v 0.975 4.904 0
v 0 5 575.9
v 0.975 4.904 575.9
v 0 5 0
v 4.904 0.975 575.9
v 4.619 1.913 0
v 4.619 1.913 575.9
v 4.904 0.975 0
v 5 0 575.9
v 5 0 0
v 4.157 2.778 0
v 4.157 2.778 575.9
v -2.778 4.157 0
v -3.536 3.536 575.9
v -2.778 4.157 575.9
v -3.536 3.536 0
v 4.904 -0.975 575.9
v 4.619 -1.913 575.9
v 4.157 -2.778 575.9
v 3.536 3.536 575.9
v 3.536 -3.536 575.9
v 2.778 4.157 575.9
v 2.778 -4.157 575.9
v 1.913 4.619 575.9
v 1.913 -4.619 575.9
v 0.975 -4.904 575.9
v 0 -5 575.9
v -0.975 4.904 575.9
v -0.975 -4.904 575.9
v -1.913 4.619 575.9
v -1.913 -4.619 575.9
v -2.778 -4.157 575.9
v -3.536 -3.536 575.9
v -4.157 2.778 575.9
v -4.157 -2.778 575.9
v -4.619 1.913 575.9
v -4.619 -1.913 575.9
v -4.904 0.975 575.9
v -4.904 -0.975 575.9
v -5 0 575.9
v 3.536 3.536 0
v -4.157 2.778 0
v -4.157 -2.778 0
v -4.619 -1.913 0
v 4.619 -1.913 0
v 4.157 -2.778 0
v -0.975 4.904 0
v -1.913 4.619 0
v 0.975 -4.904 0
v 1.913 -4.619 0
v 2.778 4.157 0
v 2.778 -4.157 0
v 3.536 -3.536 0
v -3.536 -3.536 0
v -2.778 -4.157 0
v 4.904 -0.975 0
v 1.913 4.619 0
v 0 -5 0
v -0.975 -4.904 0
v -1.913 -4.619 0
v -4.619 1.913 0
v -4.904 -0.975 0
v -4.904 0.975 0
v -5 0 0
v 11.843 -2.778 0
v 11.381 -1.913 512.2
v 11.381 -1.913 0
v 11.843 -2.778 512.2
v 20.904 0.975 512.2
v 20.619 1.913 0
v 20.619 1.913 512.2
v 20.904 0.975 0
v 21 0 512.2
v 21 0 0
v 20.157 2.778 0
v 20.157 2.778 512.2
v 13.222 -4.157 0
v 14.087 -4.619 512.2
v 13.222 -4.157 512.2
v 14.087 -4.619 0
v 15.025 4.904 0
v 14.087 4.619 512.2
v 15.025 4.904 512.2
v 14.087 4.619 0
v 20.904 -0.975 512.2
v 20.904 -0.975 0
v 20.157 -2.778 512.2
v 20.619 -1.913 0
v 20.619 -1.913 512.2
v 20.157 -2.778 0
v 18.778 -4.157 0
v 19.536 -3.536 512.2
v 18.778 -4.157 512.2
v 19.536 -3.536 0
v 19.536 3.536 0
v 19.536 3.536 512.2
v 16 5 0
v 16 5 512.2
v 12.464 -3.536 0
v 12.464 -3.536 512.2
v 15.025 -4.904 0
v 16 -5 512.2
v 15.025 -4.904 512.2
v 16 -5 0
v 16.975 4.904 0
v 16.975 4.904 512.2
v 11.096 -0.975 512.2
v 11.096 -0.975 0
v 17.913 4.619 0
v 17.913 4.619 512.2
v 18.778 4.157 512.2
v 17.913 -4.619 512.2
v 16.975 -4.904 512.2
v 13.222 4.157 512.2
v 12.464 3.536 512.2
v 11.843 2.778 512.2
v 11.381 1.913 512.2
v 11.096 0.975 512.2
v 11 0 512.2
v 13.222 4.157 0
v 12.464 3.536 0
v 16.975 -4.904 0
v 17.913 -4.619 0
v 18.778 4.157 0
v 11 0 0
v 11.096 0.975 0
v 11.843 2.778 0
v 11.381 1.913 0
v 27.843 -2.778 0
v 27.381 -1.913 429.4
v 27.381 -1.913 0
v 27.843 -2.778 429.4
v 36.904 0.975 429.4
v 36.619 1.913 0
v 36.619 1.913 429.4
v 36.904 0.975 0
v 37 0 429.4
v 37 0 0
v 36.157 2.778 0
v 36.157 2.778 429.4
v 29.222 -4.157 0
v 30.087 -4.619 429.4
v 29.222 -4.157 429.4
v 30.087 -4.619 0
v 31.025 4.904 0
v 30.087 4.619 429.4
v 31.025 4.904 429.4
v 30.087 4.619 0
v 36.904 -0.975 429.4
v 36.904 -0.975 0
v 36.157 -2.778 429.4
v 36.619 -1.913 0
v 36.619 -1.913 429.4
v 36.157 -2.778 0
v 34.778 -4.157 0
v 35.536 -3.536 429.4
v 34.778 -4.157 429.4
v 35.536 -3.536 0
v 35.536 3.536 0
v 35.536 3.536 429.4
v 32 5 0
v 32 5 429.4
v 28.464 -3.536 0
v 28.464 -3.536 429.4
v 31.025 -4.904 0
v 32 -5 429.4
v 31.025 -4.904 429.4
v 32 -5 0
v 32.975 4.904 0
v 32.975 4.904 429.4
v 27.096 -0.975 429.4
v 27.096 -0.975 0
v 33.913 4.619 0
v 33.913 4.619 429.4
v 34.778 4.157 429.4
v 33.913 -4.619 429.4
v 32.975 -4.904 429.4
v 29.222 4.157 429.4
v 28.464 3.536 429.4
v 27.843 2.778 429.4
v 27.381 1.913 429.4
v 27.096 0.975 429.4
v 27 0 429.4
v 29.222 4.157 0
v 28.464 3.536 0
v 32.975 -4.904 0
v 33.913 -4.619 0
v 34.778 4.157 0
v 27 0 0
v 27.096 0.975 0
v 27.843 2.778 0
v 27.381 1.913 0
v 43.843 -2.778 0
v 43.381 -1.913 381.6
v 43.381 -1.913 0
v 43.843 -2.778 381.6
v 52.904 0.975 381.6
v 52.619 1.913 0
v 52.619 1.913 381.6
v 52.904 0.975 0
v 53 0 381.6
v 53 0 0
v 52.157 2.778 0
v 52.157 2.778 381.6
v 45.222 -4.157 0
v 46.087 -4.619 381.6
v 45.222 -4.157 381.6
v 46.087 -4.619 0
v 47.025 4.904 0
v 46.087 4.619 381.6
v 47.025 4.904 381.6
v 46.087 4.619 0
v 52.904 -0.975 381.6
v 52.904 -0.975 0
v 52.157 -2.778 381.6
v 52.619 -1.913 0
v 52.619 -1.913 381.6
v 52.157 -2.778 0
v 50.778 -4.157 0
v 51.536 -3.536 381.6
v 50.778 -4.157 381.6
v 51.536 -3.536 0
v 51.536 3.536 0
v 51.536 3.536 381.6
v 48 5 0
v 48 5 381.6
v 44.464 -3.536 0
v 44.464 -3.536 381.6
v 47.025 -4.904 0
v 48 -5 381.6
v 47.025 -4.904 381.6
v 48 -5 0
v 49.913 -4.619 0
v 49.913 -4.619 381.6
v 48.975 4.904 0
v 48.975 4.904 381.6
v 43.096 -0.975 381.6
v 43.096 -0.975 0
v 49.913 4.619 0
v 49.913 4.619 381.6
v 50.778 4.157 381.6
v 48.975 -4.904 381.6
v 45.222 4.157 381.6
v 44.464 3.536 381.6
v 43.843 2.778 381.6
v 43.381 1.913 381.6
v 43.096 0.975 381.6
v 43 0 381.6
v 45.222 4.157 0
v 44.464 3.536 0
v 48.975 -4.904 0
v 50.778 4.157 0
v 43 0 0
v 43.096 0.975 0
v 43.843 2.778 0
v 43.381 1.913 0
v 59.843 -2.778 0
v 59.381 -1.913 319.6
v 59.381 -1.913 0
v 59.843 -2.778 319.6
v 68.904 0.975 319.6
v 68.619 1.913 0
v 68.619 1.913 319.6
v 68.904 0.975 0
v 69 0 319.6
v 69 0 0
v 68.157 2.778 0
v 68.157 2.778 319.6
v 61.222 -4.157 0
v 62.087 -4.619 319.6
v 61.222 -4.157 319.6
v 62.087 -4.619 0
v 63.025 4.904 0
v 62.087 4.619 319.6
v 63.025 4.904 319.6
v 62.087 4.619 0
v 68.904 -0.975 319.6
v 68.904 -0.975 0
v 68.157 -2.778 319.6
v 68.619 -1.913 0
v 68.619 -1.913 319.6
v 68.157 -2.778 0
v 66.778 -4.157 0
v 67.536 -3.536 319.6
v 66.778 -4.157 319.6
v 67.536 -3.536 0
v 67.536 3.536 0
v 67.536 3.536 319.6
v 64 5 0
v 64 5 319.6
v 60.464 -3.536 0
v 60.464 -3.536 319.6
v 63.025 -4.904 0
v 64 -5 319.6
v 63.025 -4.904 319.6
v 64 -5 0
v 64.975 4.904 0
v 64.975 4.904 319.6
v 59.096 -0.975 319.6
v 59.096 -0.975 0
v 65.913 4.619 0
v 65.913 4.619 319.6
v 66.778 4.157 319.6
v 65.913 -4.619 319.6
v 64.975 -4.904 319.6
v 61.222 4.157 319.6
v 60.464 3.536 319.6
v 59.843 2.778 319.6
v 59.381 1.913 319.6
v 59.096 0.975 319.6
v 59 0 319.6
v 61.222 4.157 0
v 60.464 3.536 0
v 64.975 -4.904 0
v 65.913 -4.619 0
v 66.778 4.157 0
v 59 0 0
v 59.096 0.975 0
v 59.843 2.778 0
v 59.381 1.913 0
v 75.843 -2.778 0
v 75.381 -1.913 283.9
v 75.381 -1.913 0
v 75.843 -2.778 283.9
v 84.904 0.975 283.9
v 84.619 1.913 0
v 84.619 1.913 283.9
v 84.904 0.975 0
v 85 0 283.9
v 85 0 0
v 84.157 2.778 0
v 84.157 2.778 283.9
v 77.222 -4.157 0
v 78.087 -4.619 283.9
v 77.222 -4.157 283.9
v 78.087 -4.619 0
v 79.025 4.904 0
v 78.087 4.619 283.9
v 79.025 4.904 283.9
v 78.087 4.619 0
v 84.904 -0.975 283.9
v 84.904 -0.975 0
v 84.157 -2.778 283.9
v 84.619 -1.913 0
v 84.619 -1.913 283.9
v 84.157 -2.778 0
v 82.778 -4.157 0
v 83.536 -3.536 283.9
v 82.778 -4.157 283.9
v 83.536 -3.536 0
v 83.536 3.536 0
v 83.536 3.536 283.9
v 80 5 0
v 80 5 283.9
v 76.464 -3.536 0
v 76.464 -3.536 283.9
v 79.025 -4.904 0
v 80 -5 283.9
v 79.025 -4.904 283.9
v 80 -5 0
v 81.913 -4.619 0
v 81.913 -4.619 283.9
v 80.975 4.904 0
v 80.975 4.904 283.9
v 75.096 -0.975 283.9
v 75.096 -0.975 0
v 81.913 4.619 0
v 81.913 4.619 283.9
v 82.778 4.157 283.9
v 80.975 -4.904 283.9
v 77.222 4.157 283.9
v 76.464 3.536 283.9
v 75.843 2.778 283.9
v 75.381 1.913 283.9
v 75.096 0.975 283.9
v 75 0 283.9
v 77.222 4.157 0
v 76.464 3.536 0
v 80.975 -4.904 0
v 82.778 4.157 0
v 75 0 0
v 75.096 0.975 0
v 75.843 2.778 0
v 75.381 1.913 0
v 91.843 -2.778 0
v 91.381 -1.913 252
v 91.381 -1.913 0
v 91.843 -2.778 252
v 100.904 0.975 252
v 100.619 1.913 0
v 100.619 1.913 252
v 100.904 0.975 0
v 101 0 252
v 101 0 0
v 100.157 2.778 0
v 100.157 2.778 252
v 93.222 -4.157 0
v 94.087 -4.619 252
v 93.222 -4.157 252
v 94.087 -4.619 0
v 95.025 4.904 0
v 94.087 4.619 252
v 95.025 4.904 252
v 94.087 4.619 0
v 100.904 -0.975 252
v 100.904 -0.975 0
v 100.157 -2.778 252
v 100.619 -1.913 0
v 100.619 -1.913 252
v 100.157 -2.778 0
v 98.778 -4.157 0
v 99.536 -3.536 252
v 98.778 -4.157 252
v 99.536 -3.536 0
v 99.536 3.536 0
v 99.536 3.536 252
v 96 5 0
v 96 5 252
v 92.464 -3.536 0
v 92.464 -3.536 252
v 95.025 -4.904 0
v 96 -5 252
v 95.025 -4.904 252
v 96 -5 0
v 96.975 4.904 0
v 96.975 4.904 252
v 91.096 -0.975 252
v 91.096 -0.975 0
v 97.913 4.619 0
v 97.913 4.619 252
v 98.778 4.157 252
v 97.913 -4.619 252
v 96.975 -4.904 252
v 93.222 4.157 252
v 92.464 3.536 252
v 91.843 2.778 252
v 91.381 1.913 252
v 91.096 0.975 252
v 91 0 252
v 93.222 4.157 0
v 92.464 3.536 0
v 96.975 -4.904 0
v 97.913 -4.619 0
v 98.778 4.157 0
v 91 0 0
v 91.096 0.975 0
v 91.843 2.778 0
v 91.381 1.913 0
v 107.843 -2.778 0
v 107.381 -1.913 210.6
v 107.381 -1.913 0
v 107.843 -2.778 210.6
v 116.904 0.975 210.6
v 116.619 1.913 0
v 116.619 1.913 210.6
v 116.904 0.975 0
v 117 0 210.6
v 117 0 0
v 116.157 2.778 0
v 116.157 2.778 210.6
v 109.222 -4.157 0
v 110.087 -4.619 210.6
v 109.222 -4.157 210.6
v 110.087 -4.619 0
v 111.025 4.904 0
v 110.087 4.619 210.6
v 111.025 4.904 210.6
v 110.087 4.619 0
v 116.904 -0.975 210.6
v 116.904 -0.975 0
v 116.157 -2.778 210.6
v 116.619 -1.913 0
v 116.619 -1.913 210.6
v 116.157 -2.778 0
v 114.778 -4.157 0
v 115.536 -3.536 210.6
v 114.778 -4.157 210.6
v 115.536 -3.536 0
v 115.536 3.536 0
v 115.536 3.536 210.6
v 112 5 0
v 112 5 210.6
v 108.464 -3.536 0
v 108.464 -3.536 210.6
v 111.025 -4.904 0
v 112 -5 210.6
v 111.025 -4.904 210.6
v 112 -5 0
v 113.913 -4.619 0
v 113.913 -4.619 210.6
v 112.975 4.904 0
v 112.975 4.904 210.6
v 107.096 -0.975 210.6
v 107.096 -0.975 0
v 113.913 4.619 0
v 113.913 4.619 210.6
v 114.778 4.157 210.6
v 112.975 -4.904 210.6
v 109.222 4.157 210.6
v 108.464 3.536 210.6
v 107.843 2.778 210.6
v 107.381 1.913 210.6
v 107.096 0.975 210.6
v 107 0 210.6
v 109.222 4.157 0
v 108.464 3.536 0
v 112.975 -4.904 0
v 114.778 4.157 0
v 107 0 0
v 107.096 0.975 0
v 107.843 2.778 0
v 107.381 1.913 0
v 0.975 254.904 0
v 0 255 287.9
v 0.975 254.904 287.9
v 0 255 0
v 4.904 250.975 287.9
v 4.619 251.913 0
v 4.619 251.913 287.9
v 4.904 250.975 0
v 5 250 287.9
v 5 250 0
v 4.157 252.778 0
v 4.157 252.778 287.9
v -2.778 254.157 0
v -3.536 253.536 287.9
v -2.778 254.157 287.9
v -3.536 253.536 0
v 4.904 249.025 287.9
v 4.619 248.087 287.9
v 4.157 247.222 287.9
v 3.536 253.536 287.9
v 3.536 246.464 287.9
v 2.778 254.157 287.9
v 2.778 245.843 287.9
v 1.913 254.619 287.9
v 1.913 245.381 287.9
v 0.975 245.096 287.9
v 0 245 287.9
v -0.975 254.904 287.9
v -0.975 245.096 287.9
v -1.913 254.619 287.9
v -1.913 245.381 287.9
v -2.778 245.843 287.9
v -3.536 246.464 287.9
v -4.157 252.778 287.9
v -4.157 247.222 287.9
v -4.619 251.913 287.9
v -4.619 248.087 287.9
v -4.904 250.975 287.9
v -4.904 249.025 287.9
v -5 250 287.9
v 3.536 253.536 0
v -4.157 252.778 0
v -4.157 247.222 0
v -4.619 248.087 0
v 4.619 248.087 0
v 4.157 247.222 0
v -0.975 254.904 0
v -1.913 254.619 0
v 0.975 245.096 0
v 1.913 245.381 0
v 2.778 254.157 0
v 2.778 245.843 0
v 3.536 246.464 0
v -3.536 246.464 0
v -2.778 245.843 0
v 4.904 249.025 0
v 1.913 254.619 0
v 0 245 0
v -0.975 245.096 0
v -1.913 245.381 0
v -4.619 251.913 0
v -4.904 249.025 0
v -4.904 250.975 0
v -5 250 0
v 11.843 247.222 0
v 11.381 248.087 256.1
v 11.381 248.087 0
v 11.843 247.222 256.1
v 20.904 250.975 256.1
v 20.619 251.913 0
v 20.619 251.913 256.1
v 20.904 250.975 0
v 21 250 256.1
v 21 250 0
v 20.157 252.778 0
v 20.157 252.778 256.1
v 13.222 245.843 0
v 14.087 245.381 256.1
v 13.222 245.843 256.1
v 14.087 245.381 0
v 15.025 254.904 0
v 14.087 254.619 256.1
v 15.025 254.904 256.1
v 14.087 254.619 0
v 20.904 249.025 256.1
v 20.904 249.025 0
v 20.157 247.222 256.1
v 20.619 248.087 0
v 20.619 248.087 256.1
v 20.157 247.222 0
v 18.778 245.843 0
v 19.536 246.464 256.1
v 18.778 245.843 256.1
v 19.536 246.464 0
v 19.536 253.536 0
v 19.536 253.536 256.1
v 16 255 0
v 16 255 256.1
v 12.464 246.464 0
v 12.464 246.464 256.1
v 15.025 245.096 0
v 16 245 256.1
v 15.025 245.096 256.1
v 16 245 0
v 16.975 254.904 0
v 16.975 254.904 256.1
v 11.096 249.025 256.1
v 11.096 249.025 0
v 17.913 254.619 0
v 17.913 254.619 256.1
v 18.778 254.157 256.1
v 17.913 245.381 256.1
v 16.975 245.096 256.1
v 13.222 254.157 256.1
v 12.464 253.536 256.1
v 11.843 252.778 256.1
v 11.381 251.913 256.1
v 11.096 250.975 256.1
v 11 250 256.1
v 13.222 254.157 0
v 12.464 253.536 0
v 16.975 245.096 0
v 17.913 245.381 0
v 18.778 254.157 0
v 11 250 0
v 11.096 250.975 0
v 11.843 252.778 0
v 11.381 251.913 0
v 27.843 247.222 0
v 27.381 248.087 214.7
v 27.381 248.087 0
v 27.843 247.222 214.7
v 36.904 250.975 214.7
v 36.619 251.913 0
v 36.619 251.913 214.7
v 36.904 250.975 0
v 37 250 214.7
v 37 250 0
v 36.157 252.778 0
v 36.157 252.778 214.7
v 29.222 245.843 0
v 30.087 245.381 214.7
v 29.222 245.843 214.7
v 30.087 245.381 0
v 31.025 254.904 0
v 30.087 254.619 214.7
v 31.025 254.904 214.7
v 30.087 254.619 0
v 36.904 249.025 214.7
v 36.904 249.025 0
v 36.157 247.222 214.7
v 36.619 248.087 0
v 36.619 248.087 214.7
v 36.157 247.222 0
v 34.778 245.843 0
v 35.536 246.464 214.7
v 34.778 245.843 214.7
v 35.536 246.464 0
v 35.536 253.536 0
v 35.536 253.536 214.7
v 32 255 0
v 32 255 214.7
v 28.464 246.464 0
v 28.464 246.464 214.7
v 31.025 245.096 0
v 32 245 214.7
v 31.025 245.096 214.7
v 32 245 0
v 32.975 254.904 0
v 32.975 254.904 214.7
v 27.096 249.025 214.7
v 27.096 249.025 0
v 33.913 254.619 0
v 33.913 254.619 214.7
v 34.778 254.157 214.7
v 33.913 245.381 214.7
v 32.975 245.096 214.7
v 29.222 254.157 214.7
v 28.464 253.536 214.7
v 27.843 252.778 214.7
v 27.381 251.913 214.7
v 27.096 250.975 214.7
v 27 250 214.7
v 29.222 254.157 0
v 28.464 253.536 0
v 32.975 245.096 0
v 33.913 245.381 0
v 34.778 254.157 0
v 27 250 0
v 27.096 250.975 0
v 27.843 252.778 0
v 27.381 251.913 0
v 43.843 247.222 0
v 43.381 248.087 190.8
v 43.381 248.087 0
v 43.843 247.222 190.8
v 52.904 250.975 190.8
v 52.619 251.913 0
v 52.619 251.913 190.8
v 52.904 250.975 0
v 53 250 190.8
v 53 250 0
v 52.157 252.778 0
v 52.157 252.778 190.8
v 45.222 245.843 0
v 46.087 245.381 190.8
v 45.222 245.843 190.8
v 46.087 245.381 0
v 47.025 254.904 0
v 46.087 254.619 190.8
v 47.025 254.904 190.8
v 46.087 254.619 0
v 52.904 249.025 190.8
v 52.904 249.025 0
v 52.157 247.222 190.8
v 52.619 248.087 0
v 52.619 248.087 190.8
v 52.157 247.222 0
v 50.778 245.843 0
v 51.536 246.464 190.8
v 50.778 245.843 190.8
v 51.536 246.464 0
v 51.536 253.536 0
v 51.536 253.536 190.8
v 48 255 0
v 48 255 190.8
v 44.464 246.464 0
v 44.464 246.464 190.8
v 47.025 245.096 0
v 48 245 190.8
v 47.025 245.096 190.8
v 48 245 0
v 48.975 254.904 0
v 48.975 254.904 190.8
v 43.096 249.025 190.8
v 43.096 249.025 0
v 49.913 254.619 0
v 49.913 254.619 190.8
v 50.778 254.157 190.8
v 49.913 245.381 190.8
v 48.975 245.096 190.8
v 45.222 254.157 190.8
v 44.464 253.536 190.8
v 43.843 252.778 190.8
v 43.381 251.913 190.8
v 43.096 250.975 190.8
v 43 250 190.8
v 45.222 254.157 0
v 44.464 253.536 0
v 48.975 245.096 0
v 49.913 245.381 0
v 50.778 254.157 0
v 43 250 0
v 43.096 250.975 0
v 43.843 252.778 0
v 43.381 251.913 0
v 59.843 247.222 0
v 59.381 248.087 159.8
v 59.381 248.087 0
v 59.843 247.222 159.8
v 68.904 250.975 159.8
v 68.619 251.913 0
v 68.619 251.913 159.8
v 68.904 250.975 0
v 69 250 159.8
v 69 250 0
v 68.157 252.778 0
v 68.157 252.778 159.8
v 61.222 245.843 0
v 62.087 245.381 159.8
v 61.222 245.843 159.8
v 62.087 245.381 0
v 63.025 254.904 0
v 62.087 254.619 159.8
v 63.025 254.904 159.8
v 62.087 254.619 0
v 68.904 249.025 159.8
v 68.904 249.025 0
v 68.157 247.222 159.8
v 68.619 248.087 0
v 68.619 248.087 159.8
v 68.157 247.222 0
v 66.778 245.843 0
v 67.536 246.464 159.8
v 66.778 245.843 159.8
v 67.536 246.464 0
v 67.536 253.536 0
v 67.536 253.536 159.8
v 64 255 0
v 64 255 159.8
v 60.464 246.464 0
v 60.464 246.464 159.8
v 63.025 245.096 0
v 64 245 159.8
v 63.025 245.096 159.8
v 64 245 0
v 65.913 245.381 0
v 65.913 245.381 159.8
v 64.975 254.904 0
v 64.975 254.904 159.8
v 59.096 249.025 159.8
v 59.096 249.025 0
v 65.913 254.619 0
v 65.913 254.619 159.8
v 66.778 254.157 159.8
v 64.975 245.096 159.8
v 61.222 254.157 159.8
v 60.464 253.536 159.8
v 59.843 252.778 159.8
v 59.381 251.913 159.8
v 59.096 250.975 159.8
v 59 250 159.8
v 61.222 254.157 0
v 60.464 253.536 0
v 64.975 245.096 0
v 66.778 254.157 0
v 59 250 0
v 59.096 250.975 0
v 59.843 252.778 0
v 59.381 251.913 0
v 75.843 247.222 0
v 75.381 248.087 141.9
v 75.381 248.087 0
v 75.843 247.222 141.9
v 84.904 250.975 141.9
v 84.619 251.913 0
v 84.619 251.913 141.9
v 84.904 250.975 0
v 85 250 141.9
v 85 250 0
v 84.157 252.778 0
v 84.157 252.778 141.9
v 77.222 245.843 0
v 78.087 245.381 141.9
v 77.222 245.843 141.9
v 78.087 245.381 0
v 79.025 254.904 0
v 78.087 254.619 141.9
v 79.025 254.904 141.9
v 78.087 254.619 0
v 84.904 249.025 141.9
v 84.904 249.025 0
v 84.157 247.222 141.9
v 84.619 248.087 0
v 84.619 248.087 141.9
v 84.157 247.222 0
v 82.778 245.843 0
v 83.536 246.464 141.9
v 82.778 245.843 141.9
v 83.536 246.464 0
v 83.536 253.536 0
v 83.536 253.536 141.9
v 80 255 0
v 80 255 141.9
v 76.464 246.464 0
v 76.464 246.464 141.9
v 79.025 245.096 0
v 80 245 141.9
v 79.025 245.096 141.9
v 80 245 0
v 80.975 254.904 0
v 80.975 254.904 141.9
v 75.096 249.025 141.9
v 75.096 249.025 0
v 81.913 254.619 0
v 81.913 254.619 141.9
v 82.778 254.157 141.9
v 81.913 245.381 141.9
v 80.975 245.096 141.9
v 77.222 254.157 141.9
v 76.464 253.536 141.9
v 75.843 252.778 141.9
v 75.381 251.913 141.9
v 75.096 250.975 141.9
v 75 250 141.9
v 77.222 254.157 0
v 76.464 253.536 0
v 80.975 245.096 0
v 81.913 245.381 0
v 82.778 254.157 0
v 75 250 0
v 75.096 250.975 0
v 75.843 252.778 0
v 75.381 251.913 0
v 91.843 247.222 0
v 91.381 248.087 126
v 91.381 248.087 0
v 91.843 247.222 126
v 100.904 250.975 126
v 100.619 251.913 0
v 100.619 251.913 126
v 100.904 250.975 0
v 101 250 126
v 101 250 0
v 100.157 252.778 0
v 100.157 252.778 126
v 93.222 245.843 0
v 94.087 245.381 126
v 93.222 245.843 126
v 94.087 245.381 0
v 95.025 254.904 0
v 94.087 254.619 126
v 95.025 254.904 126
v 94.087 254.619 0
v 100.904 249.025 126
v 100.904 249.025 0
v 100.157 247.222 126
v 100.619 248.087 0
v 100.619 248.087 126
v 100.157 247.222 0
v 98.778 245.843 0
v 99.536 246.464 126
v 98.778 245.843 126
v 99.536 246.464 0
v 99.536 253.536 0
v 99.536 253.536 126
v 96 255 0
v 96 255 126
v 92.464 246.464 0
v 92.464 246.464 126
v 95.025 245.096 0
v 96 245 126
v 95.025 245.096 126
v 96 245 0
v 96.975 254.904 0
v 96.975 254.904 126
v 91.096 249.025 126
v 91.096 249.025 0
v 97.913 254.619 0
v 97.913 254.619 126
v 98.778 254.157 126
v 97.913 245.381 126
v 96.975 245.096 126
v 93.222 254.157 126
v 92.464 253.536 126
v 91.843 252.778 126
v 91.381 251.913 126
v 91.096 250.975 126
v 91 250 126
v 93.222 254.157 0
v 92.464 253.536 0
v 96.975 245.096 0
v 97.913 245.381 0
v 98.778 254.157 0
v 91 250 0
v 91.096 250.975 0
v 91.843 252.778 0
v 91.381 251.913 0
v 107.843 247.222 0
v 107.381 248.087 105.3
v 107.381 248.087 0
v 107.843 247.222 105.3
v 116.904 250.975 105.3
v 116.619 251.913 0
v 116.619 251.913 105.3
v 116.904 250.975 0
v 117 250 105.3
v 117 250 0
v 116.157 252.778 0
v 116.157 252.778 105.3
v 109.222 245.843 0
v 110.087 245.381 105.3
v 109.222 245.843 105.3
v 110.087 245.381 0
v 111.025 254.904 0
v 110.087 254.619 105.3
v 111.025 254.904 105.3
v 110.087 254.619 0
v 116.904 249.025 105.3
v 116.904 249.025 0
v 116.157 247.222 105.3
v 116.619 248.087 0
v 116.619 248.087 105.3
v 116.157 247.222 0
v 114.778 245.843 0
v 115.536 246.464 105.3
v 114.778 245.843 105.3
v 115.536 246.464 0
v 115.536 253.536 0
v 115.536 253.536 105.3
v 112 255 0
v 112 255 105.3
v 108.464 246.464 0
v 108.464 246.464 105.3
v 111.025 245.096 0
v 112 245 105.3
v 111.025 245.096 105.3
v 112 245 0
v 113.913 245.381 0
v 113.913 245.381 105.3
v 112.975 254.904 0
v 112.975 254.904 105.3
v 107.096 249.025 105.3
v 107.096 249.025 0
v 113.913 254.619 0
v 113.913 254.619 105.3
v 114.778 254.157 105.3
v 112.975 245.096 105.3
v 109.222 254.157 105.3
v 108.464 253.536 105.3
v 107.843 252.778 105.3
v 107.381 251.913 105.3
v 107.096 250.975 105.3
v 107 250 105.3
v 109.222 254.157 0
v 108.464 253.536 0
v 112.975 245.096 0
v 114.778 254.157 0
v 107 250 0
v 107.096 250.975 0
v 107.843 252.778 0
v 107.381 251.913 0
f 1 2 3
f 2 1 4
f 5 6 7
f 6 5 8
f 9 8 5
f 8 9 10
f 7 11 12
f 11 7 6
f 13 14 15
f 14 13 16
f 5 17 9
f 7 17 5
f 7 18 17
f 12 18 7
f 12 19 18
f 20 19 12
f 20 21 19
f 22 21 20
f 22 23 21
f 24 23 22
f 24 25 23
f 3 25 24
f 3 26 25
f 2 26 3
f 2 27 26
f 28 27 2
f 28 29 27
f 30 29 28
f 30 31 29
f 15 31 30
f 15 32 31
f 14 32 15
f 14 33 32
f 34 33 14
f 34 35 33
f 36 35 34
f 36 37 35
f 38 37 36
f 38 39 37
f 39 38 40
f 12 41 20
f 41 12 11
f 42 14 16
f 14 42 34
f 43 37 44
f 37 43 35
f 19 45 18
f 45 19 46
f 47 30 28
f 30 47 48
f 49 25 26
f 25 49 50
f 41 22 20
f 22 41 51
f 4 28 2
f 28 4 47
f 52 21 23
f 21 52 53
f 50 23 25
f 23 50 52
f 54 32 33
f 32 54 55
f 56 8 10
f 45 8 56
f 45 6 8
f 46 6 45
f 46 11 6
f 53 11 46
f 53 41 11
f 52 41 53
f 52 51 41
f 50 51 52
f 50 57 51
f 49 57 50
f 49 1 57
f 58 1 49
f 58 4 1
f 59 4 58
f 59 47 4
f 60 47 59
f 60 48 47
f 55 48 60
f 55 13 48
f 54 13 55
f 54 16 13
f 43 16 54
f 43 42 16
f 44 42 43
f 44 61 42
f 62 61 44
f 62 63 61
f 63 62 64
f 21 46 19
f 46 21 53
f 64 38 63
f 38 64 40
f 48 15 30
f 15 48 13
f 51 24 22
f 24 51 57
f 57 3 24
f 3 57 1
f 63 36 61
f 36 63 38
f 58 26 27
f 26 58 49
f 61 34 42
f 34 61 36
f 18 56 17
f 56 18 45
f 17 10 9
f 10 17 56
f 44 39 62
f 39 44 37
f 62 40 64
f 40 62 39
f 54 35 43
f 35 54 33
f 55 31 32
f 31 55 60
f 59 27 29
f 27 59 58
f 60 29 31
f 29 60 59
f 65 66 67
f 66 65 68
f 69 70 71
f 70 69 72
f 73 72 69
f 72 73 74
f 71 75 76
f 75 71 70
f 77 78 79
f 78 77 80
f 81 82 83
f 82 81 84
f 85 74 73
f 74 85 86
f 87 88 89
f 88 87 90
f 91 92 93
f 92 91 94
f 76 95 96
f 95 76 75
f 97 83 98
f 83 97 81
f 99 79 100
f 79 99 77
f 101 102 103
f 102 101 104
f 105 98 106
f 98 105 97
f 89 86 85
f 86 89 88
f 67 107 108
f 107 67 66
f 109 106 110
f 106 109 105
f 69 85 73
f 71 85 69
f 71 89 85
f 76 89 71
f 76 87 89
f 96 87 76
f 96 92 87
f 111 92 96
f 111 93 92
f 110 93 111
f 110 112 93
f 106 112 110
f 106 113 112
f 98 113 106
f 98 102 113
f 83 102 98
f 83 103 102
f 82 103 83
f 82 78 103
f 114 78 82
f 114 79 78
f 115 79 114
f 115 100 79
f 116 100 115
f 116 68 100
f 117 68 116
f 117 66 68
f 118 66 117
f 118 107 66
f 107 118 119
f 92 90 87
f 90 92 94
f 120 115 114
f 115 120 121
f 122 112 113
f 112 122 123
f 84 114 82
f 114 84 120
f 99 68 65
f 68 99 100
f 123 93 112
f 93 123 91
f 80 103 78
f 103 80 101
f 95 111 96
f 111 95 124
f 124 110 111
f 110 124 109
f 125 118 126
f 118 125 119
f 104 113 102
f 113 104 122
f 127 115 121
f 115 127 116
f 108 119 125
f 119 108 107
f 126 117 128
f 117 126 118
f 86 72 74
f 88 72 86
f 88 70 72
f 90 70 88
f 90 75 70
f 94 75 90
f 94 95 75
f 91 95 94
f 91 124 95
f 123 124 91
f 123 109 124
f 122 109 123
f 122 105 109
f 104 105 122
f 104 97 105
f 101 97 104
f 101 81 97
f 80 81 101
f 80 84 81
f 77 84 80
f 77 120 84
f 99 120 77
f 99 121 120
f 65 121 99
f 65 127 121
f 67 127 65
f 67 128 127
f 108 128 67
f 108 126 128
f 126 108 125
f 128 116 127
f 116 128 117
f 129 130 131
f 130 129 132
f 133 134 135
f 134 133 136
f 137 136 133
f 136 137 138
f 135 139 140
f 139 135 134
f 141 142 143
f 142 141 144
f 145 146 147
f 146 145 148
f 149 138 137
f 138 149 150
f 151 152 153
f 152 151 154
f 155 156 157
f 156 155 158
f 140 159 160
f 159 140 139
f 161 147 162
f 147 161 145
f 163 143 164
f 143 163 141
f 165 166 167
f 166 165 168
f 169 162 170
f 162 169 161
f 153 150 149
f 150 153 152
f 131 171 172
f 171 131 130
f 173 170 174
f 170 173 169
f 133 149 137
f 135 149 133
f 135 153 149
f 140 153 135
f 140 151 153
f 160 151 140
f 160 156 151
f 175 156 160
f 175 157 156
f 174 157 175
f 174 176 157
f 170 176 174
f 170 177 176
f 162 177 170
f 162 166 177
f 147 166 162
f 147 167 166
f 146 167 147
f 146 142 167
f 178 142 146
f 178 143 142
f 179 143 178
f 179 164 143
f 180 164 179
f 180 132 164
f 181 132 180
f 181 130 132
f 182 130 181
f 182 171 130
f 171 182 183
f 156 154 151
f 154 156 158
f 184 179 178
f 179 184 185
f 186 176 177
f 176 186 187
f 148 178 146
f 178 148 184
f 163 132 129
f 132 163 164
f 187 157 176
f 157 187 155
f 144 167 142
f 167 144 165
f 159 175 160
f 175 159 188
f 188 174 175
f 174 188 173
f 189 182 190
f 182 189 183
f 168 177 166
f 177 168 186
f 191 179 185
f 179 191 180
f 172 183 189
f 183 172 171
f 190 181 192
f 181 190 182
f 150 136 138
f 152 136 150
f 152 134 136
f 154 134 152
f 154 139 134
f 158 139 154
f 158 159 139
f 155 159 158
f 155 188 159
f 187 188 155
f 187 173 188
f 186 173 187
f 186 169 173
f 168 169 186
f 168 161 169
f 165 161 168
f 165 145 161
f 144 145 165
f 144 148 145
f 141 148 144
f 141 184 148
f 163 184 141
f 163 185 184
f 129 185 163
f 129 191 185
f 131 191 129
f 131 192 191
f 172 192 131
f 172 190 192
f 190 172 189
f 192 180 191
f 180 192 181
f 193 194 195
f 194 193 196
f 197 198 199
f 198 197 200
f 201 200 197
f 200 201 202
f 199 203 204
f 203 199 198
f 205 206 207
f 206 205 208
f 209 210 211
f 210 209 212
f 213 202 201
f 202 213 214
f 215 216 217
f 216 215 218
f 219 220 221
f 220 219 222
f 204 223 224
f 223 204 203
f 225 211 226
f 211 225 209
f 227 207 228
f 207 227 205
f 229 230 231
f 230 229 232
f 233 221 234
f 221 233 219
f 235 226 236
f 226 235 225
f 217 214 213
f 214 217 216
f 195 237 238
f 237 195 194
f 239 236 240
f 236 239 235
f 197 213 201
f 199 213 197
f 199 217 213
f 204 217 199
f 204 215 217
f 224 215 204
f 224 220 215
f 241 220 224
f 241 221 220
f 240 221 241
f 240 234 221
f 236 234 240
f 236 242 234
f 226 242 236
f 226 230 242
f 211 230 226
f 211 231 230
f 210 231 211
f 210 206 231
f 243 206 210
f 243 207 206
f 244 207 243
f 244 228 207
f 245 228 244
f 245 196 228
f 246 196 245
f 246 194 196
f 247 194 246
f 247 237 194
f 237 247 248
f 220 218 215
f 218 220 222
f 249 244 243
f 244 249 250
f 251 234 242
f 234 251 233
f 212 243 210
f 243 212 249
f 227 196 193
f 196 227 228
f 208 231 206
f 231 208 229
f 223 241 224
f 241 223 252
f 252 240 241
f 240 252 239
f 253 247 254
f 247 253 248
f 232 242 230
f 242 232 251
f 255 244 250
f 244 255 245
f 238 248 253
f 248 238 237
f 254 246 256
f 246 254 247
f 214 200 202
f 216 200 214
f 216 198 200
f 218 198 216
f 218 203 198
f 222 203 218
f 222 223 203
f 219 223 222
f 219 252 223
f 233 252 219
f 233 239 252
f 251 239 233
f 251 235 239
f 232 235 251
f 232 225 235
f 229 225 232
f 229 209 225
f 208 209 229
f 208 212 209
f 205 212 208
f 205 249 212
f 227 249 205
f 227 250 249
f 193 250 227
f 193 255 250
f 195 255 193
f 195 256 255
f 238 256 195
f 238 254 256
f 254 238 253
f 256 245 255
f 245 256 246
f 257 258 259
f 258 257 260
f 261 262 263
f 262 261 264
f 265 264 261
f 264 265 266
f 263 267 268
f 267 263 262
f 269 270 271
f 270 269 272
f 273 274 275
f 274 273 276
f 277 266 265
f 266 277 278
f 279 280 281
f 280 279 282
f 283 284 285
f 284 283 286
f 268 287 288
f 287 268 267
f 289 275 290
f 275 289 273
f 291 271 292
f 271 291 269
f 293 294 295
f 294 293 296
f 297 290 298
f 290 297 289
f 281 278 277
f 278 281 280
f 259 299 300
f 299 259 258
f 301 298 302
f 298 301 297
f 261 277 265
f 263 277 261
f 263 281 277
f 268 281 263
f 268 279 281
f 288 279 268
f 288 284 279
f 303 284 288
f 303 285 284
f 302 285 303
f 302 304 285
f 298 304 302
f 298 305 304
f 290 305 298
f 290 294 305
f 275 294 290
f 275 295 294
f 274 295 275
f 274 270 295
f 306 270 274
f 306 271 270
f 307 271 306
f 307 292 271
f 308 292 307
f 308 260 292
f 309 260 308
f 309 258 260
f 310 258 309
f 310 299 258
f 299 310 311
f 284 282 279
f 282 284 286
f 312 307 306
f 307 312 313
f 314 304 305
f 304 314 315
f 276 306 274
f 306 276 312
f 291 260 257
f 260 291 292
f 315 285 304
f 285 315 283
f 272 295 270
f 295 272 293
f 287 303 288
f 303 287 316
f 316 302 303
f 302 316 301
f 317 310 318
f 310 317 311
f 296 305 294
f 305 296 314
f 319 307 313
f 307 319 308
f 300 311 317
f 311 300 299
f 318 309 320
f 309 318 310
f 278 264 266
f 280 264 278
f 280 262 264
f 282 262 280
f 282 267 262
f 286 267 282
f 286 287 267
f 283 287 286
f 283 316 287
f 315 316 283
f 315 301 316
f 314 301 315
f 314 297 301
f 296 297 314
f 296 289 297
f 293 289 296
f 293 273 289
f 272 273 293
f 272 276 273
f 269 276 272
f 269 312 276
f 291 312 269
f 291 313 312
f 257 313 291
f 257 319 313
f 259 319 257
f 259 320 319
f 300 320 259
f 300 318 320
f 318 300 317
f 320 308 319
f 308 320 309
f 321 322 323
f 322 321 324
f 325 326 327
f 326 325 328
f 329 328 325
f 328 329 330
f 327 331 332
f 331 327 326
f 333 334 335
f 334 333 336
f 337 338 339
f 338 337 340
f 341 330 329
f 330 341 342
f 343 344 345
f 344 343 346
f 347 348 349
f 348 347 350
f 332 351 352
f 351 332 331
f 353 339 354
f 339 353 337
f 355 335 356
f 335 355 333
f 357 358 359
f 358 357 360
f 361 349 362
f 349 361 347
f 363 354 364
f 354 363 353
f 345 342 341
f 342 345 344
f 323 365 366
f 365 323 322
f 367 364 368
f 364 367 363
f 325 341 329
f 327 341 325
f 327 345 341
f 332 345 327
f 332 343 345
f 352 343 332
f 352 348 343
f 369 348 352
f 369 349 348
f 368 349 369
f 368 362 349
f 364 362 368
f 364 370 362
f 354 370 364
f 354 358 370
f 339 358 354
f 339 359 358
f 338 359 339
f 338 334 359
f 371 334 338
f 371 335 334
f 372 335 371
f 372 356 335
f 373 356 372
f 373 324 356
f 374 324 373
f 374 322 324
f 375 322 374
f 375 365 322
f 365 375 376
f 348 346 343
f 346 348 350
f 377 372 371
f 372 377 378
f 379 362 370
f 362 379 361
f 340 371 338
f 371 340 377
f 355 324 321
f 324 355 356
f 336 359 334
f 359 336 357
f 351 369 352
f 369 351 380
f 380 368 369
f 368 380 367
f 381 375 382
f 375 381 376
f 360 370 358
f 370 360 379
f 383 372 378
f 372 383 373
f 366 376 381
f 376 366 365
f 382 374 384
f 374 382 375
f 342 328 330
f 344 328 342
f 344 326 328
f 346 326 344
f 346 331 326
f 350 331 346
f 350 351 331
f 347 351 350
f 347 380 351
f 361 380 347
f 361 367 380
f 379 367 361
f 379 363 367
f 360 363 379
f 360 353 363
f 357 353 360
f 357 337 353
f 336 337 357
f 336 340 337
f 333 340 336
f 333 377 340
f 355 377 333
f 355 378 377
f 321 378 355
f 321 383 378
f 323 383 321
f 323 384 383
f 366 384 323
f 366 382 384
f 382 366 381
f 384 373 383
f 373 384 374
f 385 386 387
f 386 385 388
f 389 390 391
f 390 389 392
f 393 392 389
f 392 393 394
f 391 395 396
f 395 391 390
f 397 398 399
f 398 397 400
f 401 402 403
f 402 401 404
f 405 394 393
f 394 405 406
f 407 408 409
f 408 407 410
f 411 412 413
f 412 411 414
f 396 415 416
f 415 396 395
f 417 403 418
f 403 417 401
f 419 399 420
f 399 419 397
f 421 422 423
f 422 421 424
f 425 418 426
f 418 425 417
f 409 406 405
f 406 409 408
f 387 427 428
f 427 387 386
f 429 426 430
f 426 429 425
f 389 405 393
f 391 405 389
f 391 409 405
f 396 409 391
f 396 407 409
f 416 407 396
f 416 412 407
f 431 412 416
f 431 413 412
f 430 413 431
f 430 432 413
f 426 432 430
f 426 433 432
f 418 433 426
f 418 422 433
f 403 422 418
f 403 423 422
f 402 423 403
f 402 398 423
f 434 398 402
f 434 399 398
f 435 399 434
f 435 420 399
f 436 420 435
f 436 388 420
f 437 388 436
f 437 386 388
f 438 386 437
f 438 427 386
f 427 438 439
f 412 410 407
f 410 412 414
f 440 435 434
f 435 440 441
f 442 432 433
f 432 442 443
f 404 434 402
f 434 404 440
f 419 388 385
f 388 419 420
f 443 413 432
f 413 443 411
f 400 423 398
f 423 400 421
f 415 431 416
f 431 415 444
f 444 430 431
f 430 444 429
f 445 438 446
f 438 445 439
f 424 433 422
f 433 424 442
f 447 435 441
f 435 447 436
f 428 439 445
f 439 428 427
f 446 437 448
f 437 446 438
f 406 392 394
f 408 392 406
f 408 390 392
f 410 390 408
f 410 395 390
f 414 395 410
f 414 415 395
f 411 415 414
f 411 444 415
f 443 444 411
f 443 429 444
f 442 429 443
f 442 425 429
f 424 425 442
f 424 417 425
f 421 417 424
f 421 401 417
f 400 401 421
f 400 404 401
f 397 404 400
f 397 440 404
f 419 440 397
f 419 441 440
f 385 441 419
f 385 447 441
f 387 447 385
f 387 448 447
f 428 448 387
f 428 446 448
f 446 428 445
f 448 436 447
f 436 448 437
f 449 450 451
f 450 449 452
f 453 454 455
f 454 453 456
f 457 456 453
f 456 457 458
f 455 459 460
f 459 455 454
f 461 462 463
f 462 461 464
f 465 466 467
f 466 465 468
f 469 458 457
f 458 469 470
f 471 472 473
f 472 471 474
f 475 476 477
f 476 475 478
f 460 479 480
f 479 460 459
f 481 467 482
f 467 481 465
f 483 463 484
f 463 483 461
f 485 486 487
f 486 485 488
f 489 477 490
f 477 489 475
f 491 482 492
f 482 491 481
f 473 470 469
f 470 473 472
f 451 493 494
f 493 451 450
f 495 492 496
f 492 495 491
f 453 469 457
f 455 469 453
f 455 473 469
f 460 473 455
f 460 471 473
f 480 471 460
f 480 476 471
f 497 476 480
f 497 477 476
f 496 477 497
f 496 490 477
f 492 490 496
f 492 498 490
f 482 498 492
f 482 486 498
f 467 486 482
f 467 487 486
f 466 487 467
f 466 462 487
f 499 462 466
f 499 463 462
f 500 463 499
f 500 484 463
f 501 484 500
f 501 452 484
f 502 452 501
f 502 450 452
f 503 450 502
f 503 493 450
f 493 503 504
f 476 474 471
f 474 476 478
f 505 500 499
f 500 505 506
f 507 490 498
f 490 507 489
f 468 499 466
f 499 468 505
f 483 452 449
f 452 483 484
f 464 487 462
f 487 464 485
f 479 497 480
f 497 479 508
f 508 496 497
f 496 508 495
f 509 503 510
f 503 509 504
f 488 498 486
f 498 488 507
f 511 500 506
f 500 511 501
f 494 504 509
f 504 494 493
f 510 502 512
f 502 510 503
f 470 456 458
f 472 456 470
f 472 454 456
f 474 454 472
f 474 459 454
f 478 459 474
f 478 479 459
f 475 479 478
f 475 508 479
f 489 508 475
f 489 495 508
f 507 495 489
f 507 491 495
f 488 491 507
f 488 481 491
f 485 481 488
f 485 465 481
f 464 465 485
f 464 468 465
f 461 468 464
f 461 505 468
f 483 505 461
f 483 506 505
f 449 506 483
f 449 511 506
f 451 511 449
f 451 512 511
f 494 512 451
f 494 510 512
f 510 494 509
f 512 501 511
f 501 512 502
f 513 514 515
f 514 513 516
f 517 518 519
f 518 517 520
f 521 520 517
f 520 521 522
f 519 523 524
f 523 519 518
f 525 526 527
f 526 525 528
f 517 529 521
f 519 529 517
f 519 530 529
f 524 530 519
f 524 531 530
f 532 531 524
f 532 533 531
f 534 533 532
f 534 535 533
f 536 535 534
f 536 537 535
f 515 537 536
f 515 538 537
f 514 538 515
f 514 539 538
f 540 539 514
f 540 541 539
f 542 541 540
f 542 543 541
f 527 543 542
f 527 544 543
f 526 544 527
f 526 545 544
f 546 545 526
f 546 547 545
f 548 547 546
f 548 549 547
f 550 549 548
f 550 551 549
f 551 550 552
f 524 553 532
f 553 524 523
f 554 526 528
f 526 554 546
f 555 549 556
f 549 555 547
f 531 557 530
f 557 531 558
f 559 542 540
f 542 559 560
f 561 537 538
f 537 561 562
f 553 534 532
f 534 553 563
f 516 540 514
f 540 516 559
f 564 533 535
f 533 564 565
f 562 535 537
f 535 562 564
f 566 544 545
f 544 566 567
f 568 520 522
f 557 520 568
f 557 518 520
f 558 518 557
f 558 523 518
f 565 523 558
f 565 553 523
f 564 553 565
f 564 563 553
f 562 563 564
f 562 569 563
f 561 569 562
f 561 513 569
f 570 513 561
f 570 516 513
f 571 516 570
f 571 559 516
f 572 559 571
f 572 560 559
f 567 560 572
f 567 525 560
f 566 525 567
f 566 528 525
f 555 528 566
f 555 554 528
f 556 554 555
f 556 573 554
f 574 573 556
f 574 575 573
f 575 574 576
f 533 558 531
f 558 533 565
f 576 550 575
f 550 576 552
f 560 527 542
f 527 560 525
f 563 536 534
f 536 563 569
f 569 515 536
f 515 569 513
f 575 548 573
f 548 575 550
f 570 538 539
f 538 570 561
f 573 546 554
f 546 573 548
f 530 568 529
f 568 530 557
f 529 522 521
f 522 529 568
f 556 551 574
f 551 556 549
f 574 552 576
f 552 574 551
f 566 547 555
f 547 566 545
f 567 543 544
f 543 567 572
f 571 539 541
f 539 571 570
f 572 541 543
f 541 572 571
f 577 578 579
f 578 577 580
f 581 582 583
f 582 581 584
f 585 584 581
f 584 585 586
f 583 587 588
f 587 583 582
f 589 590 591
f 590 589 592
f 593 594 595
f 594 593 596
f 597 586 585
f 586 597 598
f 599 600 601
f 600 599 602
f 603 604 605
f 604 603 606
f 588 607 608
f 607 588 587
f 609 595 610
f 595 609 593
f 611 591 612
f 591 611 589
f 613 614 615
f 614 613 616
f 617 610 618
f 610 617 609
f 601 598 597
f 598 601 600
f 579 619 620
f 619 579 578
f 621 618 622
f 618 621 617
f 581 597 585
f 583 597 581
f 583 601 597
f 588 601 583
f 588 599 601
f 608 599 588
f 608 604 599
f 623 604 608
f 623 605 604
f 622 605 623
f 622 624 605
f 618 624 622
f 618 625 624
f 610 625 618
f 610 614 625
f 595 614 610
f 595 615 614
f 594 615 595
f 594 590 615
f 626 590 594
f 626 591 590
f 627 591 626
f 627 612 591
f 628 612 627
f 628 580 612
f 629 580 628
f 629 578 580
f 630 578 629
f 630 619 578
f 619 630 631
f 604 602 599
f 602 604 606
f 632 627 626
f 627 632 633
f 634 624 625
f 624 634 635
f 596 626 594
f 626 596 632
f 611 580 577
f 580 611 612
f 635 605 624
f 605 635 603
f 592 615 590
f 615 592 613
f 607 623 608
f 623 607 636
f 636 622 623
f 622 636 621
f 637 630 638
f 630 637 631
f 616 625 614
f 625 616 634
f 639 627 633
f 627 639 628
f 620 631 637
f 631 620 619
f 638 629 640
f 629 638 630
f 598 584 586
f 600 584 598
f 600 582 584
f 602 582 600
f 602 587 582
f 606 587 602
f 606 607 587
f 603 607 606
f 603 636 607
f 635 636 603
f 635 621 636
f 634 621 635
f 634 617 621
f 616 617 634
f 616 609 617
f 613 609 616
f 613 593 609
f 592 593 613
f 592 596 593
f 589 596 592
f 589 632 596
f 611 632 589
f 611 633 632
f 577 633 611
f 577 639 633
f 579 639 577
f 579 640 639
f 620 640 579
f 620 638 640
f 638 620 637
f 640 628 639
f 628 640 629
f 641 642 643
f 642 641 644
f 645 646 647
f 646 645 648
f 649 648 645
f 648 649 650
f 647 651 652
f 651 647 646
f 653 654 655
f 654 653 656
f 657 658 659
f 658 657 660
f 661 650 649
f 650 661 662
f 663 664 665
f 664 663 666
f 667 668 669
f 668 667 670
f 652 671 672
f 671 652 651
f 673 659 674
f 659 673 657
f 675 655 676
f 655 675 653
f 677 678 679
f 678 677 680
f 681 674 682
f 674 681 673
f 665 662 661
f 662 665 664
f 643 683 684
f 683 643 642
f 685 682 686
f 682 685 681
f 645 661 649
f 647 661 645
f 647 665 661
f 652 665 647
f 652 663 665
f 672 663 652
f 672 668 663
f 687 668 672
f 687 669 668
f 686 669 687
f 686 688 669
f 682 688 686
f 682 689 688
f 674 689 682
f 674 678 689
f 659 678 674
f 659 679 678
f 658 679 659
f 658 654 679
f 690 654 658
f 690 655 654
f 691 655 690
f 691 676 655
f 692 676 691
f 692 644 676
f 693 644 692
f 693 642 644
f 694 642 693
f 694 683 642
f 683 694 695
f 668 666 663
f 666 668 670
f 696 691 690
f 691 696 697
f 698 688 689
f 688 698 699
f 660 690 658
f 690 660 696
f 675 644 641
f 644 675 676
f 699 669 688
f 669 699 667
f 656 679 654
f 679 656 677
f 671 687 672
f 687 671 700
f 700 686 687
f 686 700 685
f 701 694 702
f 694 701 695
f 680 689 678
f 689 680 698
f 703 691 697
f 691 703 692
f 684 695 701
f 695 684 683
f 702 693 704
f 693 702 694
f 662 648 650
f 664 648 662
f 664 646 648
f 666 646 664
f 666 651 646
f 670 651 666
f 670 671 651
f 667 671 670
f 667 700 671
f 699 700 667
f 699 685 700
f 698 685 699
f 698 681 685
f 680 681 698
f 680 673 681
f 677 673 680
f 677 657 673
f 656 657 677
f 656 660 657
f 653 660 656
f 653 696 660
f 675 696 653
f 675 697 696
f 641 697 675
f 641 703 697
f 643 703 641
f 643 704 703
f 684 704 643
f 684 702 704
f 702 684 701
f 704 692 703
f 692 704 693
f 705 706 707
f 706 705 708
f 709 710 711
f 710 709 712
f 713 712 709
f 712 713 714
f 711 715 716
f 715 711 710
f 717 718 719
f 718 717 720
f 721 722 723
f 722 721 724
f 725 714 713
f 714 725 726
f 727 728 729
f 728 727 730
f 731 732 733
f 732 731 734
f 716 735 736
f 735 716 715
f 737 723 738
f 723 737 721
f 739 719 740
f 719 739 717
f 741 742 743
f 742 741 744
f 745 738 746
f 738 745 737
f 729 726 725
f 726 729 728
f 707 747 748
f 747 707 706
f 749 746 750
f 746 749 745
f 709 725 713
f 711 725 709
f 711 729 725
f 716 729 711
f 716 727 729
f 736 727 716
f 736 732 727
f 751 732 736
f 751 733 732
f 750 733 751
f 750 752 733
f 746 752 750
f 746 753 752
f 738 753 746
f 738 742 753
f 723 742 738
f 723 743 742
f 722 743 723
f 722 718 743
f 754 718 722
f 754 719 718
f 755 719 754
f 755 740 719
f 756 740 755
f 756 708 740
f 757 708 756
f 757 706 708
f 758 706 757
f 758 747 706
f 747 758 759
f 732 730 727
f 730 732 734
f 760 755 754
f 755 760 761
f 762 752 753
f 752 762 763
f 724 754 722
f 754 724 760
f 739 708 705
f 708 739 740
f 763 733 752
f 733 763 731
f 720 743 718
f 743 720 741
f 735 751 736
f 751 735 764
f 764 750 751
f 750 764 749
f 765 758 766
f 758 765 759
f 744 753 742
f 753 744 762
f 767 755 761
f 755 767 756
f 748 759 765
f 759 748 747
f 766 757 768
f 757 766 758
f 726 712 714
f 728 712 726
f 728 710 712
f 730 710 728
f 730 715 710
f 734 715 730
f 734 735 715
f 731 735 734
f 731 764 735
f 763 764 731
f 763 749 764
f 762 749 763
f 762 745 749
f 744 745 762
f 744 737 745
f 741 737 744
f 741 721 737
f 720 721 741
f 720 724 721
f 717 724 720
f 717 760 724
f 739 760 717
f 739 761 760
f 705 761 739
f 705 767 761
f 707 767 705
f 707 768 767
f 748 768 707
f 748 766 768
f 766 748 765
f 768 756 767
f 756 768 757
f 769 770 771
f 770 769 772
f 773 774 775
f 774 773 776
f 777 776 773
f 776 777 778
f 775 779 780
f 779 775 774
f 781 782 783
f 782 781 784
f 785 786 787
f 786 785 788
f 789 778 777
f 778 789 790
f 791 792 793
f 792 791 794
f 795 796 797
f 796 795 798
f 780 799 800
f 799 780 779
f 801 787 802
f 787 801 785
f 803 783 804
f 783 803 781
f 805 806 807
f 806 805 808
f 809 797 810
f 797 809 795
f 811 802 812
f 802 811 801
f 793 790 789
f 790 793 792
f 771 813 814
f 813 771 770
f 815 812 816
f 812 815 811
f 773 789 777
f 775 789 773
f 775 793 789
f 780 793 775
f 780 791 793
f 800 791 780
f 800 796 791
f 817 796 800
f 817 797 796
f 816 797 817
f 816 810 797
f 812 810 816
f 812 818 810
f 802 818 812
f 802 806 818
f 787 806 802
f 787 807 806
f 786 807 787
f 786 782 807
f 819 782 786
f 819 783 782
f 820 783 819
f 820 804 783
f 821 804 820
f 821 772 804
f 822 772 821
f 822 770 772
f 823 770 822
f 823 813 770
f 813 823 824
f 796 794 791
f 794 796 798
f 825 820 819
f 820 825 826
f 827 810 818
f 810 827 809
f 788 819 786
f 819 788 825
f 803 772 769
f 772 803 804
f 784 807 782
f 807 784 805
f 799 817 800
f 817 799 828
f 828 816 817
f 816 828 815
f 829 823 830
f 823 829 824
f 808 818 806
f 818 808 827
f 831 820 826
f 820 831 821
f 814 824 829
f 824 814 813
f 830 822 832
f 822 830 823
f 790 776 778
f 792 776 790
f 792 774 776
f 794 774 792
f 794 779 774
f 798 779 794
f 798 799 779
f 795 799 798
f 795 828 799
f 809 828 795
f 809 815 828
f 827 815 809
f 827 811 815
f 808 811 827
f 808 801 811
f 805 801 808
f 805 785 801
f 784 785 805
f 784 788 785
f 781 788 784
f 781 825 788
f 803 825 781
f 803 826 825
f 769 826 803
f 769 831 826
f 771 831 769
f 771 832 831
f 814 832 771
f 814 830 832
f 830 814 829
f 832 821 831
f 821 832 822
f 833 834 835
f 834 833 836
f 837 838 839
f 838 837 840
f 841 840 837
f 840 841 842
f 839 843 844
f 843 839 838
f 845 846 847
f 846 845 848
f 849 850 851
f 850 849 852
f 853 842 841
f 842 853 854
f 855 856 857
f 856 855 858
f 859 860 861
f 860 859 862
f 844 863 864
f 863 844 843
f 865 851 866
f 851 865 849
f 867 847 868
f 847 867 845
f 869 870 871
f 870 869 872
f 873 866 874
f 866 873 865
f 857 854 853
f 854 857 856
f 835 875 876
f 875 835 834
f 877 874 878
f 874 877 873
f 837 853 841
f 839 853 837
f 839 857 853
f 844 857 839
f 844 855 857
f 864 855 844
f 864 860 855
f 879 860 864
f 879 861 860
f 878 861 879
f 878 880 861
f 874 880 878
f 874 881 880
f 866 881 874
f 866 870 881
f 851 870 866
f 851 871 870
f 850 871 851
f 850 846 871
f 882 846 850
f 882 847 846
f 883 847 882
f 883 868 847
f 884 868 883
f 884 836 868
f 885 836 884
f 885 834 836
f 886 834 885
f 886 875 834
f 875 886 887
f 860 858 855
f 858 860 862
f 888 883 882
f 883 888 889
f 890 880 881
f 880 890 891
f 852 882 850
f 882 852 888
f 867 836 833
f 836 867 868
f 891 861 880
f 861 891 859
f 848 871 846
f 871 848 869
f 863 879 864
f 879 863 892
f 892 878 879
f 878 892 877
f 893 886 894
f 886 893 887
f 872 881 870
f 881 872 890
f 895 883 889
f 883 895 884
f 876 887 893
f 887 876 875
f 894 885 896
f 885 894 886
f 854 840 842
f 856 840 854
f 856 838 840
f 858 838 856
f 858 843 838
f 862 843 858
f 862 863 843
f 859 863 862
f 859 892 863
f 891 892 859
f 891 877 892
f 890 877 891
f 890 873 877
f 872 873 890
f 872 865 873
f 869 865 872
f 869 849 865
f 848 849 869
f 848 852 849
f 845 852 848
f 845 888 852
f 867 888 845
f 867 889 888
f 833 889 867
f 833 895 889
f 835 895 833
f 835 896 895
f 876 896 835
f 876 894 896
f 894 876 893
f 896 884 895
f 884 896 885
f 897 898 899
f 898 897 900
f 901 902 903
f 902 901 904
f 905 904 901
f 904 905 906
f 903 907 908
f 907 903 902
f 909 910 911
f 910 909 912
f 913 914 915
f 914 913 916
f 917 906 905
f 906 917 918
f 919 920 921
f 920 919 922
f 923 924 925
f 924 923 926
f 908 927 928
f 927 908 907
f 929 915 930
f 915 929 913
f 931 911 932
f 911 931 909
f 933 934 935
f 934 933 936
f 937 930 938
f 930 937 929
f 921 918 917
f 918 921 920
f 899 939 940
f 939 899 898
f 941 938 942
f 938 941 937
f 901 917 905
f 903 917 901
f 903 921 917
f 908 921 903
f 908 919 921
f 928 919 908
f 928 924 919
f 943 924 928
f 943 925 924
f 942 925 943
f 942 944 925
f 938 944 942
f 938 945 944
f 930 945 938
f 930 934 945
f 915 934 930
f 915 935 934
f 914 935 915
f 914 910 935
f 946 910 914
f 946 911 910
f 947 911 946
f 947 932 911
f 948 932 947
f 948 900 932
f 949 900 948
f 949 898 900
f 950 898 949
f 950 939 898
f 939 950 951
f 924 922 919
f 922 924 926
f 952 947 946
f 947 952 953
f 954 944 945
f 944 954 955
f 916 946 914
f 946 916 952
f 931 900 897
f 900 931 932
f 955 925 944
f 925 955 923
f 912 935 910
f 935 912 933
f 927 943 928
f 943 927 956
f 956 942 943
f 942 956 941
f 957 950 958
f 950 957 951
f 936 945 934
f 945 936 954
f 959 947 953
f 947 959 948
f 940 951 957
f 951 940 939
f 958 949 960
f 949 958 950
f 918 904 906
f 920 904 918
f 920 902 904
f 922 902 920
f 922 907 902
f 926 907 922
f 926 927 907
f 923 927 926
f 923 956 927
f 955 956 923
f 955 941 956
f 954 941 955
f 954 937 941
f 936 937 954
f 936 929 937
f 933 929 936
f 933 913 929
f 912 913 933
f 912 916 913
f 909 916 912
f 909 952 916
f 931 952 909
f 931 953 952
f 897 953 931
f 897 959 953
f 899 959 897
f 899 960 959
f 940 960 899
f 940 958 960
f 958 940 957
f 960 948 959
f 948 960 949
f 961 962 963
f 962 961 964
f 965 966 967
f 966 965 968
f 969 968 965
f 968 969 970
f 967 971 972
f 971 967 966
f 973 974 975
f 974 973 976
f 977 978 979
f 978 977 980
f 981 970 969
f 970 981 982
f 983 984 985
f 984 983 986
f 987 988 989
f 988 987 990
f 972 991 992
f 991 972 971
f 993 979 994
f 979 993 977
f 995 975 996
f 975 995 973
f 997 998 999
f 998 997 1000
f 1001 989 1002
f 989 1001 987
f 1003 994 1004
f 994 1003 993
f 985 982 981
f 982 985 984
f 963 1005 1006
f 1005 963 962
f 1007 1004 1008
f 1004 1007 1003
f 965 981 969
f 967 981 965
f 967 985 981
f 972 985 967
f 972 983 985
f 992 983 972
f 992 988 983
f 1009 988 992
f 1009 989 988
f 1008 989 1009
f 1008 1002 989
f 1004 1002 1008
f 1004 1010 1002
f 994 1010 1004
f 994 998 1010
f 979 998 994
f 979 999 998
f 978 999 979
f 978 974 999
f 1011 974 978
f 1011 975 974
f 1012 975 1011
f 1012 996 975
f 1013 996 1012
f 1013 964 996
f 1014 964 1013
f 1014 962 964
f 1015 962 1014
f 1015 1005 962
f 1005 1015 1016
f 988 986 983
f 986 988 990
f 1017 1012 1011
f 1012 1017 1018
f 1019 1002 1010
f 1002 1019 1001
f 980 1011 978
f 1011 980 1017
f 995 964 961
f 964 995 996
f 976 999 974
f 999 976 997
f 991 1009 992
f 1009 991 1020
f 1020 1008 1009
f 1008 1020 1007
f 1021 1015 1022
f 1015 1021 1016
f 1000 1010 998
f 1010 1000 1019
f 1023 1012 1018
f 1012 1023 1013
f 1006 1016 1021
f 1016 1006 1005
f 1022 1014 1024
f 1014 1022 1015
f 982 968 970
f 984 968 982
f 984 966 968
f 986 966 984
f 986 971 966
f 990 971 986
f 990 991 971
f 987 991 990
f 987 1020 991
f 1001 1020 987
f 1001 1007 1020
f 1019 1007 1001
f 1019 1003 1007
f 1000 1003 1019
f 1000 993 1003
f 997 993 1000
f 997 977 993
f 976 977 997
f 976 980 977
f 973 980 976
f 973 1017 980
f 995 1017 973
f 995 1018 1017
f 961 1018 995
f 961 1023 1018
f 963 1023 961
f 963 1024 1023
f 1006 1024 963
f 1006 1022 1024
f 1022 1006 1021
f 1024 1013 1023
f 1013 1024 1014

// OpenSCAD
// Sheng pipe-rank ENVELOPE master — branch comparison, both architectures.
//
// Authority: pending_measurement. NOT fabrication authority until reviewed.
//
// SCOPE: this file models ONLY the pipe-rank envelope (pipe length + rank
// position) for each architecture branch, using the exact predicted_L_geom_mm
// values already published in the branch family-spec.csv tables. It is a
// branch-comparison / packaging-envelope aid, nothing more.
//
// OUT OF SCOPE (do NOT add without measured evidence):
//   - Reed/reed-table geometry (window, tongue, gap, frame land).
//   - Windchest chamber, socket map, gasket land, pressure path, service
//     access.
//   - Voicing, onset pressure, pull-down, blow/draw behavior.
// All of the above are unknown_requires_measurement per
// cad/p0-p1-control-parameters.csv (reed gates stay OPEN — legitimately
// unmeasured). This master must be hand-refined only after P0 reed-coupon and
// P1 single-pipe control-log measurements exist (see
// free-reed-empirical-loop.md, p0-reed-coupon-log.csv,
// p1-single-pipe-control-log.csv).
//
// Dimension sources (do not edit length values without updating the source
// table row):
//   - traditional_lengths_mm[] <- traditional-side-branch/family-spec.csv
//     column predicted_L_geom_mm (dimension_provenance=physics_derived,
//     acoustic_law=side_branch_reed, end_condition=both_ends_open, half-wave
//     row per architecture-choice.md).
//   - compact_lengths_mm[] <- compact-control/family-spec.csv column
//     predicted_L_geom_mm (dimension_provenance=physics_derived,
//     acoustic_law=closed_open, end_condition=one_end_closed_reed,
//     quarter-wave row per architecture-choice.md).
//   - Both tables are branch-comparison scaffolds only (design.md "Scope");
//     rows are physics_derived / analysis_only, not cut-ready
//     (cad/p0-p1-control-parameters.csv rows CAD-P1-TRAD-001 /
//     CAD-P1-COMP-001).
//   - pipe_dia_mm below is a visualization_placeholder / prototype_assumption
//     ONLY — real bore/reed-window geometry is unknown_requires_measurement
//     (CAD-P0-001, CAD-P0-002). It carries no acoustic or fabrication
//     authority; it exists only so the rank envelope renders as solid stock.
//
// Units: millimeters.

/* [Branch selection] */
// 0 = traditional-side-branch only, 1 = compact-control only,
// 2 = both, side-by-side for comparison (default; matches packet's stated
// purpose of publishing both branches as separate, comparable variants).
branch_display = 2;

/* [Pipe-rank note table — shared note set across both branches] */
note_names = ["D4", "E4", "G4", "A4", "C5", "D5", "E5", "G5"];
target_hz  = [293.66, 329.63, 392.00, 440.00, 523.25, 587.33, 659.25, 784.00];

// traditional-side-branch/family-spec.csv, predicted_L_geom_mm column,
// rows SNG-TRAD-D4 .. SNG-TRAD-G5 (half-wave, side_branch_reed).
traditional_lengths_mm = [575.9, 512.2, 429.4, 381.6, 319.6, 283.9, 252.0, 210.6];

// compact-control/family-spec.csv, predicted_L_geom_mm column,
// rows SNG-COMP-D4 .. SNG-COMP-G5 (quarter-wave, closed_open).
compact_lengths_mm = [287.9, 256.1, 214.7, 190.8, 159.8, 141.9, 126.0, 105.3];

/* [Envelope-only cross-section — visualization placeholder, not a bore spec] */
pipe_dia_mm     = 10;  // prototype_assumption; NOT reed window / bore geometry
pipe_gap_mm     = 6;   // prototype_assumption; rank spacing clearance only
branch_offset_mm = 250; // separation between the two comparison ranks (display only)

// ---------------------------------------------------------------------------
// Derived geometry (equation-driven placement; lengths themselves are the
// published table values above, not derived here)
// ---------------------------------------------------------------------------

pitch_mm = pipe_dia_mm + pipe_gap_mm;

function rank_x(i) = i * pitch_mm;

// One envelope pipe: a plain round blank of the table length, standing on
// the rank baseline (z=0). No reed window, bore taper, or socket cut — those
// are out of scope per header.
module envelope_pipe(length_mm) {
  cylinder(h = length_mm, d = pipe_dia_mm, $fn = 32);
}

module pipe_rank(lengths_mm) {
  for (i = [0 : len(lengths_mm) - 1])
    translate([rank_x(i), 0, 0])
      envelope_pipe(lengths_mm[i]);
}

module traditional_side_branch_rank() {
  // side_branch_reed, both_ends_open — half-wave rank.
  pipe_rank(traditional_lengths_mm);
}

module compact_control_rank() {
  // closed_open, one_end_closed_reed — quarter-wave rank.
  pipe_rank(compact_lengths_mm);
}

module sheng_envelope_assembly() {
  if (branch_display == 0) {
    traditional_side_branch_rank();
  } else if (branch_display == 1) {
    compact_control_rank();
  } else {
    // Both branches, offset along Y so neither rank overlaps the other.
    // This is a display convenience only — it does not imply a shared
    // windchest or fabrication layout between the two branches
    // (design.md: "Do not mix rows across branches in one fabrication
    // drawing.").
    translate([0, 0, 0])
      traditional_side_branch_rank();
    translate([0, branch_offset_mm, 0])
      compact_control_rank();
  }
}

sheng_envelope_assembly();

// Echo the rank tables so `openscad` doubles as a length-table sanity check
// against the source family-spec.csv files.
for (i = [0 : len(note_names) - 1])
  echo(str("traditional_", note_names[i], "_L_geom_mm=", traditional_lengths_mm[i]));
for (i = [0 : len(note_names) - 1])
  echo(str("compact_", note_names[i], "_L_geom_mm=", compact_lengths_mm[i]));
